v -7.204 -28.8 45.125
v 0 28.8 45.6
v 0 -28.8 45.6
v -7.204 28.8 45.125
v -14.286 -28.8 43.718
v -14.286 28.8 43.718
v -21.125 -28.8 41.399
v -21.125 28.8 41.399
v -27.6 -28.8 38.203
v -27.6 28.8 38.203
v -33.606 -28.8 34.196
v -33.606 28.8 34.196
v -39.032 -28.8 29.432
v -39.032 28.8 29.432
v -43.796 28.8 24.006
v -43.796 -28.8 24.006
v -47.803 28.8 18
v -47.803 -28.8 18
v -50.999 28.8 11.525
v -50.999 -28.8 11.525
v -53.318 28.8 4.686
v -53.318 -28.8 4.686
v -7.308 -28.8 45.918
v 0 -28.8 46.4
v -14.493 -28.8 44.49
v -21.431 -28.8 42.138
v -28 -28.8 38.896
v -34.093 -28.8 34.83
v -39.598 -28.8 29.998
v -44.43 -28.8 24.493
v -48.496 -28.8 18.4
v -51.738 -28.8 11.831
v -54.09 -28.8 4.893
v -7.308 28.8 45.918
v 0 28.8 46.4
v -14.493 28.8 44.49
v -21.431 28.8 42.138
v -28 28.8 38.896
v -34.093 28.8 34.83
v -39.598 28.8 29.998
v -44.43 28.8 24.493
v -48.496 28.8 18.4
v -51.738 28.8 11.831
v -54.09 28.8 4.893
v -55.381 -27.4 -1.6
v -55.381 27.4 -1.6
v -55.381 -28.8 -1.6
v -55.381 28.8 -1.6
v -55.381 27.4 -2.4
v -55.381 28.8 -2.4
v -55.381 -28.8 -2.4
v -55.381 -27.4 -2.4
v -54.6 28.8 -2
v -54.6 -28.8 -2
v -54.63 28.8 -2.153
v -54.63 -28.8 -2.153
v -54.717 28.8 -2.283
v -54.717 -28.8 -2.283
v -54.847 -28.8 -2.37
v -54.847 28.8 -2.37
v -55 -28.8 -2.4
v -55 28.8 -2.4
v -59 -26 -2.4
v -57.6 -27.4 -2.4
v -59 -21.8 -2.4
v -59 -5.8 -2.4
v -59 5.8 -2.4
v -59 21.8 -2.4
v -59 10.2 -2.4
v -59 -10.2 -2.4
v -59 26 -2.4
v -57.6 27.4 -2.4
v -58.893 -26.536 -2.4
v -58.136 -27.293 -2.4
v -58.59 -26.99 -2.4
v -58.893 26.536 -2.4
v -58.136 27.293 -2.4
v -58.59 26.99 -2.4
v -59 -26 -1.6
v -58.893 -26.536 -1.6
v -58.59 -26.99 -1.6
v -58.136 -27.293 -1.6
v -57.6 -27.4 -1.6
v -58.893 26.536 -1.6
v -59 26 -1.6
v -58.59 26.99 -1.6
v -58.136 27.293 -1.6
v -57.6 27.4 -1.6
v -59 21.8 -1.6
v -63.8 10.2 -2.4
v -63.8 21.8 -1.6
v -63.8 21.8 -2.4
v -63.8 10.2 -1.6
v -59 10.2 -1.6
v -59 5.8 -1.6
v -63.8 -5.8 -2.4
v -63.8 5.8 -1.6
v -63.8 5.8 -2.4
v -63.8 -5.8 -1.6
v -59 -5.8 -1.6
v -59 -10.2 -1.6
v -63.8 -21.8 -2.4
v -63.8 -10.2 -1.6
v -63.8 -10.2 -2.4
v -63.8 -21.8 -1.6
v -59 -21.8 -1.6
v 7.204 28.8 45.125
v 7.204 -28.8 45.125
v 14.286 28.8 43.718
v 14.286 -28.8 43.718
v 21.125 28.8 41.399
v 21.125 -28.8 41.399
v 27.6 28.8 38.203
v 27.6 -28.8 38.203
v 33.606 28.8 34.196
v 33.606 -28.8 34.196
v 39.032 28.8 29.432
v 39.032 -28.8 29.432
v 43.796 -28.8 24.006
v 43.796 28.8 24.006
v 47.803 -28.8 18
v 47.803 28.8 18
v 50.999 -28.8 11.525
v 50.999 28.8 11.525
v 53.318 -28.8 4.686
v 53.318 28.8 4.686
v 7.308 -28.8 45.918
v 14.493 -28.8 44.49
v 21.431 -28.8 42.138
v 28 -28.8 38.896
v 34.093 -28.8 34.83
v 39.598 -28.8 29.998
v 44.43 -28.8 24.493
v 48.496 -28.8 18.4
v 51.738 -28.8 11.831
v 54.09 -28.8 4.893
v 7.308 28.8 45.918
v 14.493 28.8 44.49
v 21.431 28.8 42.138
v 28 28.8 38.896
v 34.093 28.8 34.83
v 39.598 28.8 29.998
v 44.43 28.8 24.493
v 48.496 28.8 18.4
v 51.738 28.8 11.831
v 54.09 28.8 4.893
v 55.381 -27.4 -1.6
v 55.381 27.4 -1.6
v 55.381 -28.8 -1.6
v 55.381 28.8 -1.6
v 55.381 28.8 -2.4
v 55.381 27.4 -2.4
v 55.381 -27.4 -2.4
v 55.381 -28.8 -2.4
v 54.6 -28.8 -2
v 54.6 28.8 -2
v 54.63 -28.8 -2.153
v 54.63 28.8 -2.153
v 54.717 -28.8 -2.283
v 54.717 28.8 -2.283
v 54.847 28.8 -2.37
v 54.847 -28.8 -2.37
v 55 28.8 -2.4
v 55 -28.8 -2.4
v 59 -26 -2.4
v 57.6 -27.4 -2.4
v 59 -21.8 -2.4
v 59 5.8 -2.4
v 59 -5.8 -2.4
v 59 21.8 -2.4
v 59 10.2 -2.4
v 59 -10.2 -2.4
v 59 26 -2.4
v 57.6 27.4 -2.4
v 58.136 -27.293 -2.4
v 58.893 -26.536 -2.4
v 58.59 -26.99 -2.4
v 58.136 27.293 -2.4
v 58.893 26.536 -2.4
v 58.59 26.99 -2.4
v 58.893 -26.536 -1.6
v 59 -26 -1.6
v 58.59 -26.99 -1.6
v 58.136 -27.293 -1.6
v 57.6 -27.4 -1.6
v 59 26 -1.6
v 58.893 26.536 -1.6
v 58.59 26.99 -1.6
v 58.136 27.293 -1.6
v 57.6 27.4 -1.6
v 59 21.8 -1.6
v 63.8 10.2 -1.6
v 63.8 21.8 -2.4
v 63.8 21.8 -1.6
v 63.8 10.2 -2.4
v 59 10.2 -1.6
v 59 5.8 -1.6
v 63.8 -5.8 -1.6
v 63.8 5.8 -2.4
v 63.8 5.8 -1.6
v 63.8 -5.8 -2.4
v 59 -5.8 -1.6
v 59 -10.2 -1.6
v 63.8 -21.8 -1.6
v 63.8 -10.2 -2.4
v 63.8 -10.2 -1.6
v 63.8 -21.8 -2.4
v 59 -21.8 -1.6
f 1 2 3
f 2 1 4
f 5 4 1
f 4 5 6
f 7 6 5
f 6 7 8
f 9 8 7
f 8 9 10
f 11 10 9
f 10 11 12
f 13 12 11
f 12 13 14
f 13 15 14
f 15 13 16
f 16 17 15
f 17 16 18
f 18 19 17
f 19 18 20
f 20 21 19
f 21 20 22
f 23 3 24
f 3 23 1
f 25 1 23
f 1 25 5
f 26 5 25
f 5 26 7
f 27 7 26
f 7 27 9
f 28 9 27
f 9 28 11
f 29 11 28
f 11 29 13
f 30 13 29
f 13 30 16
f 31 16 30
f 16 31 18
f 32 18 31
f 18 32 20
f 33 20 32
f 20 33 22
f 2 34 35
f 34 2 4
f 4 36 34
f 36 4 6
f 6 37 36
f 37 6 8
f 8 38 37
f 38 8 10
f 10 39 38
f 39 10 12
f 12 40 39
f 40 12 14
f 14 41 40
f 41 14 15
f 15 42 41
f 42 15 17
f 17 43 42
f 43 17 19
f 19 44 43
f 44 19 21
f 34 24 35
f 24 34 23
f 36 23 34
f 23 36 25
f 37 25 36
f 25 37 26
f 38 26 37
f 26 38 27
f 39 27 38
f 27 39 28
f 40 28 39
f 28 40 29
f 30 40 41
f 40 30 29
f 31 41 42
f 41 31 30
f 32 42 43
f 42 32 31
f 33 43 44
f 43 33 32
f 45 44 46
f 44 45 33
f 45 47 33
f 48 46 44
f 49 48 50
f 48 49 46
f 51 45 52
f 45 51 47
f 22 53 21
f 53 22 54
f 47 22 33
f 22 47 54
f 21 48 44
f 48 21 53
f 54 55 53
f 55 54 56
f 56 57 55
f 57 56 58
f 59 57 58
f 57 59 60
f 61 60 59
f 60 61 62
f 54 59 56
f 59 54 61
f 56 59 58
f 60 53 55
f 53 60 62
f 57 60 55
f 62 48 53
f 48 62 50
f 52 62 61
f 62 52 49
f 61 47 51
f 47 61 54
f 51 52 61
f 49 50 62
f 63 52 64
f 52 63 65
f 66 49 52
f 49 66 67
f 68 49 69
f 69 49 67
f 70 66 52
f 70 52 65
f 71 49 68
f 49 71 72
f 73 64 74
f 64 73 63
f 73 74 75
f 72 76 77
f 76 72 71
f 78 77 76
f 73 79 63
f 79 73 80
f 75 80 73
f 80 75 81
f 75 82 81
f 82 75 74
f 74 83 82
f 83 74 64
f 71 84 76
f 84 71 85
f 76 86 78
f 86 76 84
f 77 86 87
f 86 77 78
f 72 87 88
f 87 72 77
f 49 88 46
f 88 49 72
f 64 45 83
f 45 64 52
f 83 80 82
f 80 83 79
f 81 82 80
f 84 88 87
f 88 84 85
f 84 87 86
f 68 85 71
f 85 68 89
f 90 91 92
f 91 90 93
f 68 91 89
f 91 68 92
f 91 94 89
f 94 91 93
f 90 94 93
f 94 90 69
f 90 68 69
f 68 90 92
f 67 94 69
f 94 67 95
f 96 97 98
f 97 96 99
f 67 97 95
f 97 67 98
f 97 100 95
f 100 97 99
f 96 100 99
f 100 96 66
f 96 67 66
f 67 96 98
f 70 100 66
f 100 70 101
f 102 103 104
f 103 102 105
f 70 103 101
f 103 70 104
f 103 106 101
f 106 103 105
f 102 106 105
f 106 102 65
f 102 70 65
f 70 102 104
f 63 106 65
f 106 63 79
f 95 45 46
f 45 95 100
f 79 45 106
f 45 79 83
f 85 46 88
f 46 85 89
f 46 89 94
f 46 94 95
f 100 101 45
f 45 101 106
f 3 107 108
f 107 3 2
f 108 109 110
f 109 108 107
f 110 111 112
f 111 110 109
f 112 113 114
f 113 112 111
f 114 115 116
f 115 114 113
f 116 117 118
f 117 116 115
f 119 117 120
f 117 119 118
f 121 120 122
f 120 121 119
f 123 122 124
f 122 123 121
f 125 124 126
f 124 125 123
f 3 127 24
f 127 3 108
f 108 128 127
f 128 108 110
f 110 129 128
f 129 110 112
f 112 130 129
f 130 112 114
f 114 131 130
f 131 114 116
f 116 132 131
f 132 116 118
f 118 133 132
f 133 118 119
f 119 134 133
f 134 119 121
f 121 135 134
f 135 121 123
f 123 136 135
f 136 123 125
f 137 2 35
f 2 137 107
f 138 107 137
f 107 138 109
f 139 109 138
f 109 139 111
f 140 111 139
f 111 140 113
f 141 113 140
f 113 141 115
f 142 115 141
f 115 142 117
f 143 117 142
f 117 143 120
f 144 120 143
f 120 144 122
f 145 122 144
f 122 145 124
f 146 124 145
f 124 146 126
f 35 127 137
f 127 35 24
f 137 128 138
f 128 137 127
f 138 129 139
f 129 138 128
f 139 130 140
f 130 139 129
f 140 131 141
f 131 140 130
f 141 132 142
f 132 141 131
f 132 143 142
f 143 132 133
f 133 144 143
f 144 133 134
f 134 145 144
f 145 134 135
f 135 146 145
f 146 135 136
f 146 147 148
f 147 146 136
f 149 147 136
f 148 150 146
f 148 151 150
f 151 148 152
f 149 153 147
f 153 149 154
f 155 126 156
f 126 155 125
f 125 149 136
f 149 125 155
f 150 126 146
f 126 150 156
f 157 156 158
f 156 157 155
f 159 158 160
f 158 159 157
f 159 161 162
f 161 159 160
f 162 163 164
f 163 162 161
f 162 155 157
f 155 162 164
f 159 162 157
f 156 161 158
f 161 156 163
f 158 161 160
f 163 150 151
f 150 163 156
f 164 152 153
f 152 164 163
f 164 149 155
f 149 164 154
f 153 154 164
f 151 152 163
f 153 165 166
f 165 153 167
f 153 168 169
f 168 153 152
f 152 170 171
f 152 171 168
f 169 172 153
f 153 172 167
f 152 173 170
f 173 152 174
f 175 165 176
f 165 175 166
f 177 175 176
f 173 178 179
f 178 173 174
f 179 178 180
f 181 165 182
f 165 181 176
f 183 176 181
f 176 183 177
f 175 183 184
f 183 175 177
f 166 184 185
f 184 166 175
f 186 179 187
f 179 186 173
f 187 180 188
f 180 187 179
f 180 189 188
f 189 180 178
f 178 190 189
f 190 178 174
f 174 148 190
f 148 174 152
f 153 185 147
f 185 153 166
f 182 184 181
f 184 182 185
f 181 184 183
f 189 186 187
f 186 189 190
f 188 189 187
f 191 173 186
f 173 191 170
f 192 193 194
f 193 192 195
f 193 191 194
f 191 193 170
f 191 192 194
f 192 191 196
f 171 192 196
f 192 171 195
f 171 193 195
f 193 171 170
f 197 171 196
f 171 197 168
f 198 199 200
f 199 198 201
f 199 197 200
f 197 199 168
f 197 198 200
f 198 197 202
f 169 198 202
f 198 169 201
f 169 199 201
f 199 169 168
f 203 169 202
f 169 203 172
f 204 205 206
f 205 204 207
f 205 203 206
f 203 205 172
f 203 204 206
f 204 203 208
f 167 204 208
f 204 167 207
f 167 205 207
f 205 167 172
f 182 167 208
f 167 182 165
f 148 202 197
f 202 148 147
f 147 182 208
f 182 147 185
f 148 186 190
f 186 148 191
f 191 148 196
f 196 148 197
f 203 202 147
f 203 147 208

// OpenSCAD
// file: ../p/48/5-24edge.scad
use <../../lib.scad>
function ldraw_lib__48__5_24edge() = [
// 0 Hi-Res Circle 0.2083
// 0 Name: 48\5-24edge.dat
// 0 Author: Paul Easter [pneaster]
// 0 !LDRAW_ORG 48_Primitive UPDATE 2009-03
// 0 !LICENSE Licensed under CC BY 4.0 : see CAreadme.txt
// 
// 0 BFC CERTIFY CCW
  [0,"BFC","CERTIFY"],
  [0,"BFC","CCW"],
// 
// 0 !HISTORY 2009-12-29 [PTadmin] Official Update 2009-03
// 
// 
// 2 24 1 0 0 .9914 0 .1305
  [2,24,1,0,0,.9914,0,.1305],
// 2 24 .9914 0 .1305 .9659 0 .2588
  [2,24,.9914,0,.1305,.9659,0,.2588],
// 2 24 .9659 0 .2588 .9239 0 .3827
  [2,24,.9659,0,.2588,.9239,0,.3827],
// 2 24 .9239 0 .3827 .866 0 .5
  [2,24,.9239,0,.3827,.866,0,.5],
// 2 24 .866 0 .5 .7934 0 .6088
  [2,24,.866,0,.5,.7934,0,.6088],
// 2 24 .7934 0 .6088 .7071 0 .7071
  [2,24,.7934,0,.6088,.7071,0,.7071],
// 2 24 .7071 0 .7071 .6088 0 .7934
  [2,24,.7071,0,.7071,.6088,0,.7934],
// 2 24 .6088 0 .7934 .5 0 .866
  [2,24,.6088,0,.7934,.5,0,.866],
// 2 24 .5 0 .866 .3827 0 .9239
  [2,24,.5,0,.866,.3827,0,.9239],
// 2 24 .3827 0 .9239 .2588 0 .9659
  [2,24,.3827,0,.9239,.2588,0,.9659],
// 
// 0 end of file
// 
];
module ldraw_lib__48__5_24edge(step=0, col=false, unit=2/5, alt=false, line=0.2, solid=!$preview)
    makepoly(ldraw_lib__48__5_24edge(), step=step, col=col, unit=unit, alt=alt, line=line, solid=solid);
ldraw_lib__48__5_24edge(line=0.2);
// file: ../p/48/5-24cyli.scad
use <../../lib.scad>
function ldraw_lib__48__5_24cyli() = [
// 0 Hi-Res Cylinder 0.2083
// 0 Name: 48\5-24cyli.dat
// 0 Author: Willy Tschager [Holly-Wood]
// 0 !LDRAW_ORG 48_Primitive UPDATE 2024-01
// 0 !LICENSE Licensed under CC BY 4.0 : see CAreadme.txt
// 
// 0 BFC CERTIFY CCW
  [0,"BFC","CERTIFY"],
  [0,"BFC","CCW"],
// 
// 0 !HISTORY 2009-12-29 [PTadmin] Official Update 2009-03
// 0 !HISTORY 2024-01-16 [Holly-Wood] Complete regeneration, original by guyvivan
// 0 !HISTORY 2024-01-29 [OrionP] Official Update 2024-01
// 
// 4 16 0.9914 0 0.1305 1 0 0 1 1 0 0.9914 1 0.1305
  [4,16,0.9914,0,0.1305,1,0,0,1,1,0,0.9914,1,0.1305],
// 4 16 0.9659 0 0.2588 0.9914 0 0.1305 0.9914 1 0.1305 0.9659 1 0.2588
  [4,16,0.9659,0,0.2588,0.9914,0,0.1305,0.9914,1,0.1305,0.9659,1,0.2588],
// 4 16 0.9239 0 0.3827 0.9659 0 0.2588 0.9659 1 0.2588 0.9239 1 0.3827
  [4,16,0.9239,0,0.3827,0.9659,0,0.2588,0.9659,1,0.2588,0.9239,1,0.3827],
// 4 16 0.866 0 0.5 0.9239 0 0.3827 0.9239 1 0.3827 0.866 1 0.5
  [4,16,0.866,0,0.5,0.9239,0,0.3827,0.9239,1,0.3827,0.866,1,0.5],
// 4 16 0.7934 0 0.6088 0.866 0 0.5 0.866 1 0.5 0.7934 1 0.6088
  [4,16,0.7934,0,0.6088,0.866,0,0.5,0.866,1,0.5,0.7934,1,0.6088],
// 4 16 0.7071 0 0.7071 0.7934 0 0.6088 0.7934 1 0.6088 0.7071 1 0.7071
  [4,16,0.7071,0,0.7071,0.7934,0,0.6088,0.7934,1,0.6088,0.7071,1,0.7071],
// 4 16 0.6088 0 0.7934 0.7071 0 0.7071 0.7071 1 0.7071 0.6088 1 0.7934
  [4,16,0.6088,0,0.7934,0.7071,0,0.7071,0.7071,1,0.7071,0.6088,1,0.7934],
// 4 16 0.5 0 0.866 0.6088 0 0.7934 0.6088 1 0.7934 0.5 1 0.866
  [4,16,0.5,0,0.866,0.6088,0,0.7934,0.6088,1,0.7934,0.5,1,0.866],
// 4 16 0.3827 0 0.9239 0.5 0 0.866 0.5 1 0.866 0.3827 1 0.9239
  [4,16,0.3827,0,0.9239,0.5,0,0.866,0.5,1,0.866,0.3827,1,0.9239],
// 4 16 0.2588 0 0.9659 0.3827 0 0.9239 0.3827 1 0.9239 0.2588 1 0.9659
  [4,16,0.2588,0,0.9659,0.3827,0,0.9239,0.3827,1,0.9239,0.2588,1,0.9659],
// 0 // conditional lines
// 5 24 1 1 0 1 0 0 1 1 -0.1317 0.9914 1 0.1305
  [5,24,1,1,0,1,0,0,1,1,-0.1317,0.9914,1,0.1305],
// 5 24 0.9914 1 0.1305 0.9914 0 0.1305 1 1 0 0.9659 1 0.2588
  [5,24,0.9914,1,0.1305,0.9914,0,0.1305,1,1,0,0.9659,1,0.2588],
// 5 24 0.9659 1 0.2588 0.9659 0 0.2588 0.9914 1 0.1305 0.9239 1 0.3827
  [5,24,0.9659,1,0.2588,0.9659,0,0.2588,0.9914,1,0.1305,0.9239,1,0.3827],
// 5 24 0.9239 1 0.3827 0.9239 0 0.3827 0.9659 1 0.2588 0.866 1 0.5
  [5,24,0.9239,1,0.3827,0.9239,0,0.3827,0.9659,1,0.2588,0.866,1,0.5],
// 5 24 0.866 1 0.5 0.866 0 0.5 0.9239 1 0.3827 0.7934 1 0.6088
  [5,24,0.866,1,0.5,0.866,0,0.5,0.9239,1,0.3827,0.7934,1,0.6088],
// 5 24 0.7934 1 0.6088 0.7934 0 0.6088 0.866 1 0.5 0.7071 1 0.7071
  [5,24,0.7934,1,0.6088,0.7934,0,0.6088,0.866,1,0.5,0.7071,1,0.7071],
// 5 24 0.7071 1 0.7071 0.7071 0 0.7071 0.7934 1 0.6088 0.6088 1 0.7934
  [5,24,0.7071,1,0.7071,0.7071,0,0.7071,0.7934,1,0.6088,0.6088,1,0.7934],
// 5 24 0.6088 1 0.7934 0.6088 0 0.7934 0.7071 1 0.7071 0.5 1 0.866
  [5,24,0.6088,1,0.7934,0.6088,0,0.7934,0.7071,1,0.7071,0.5,1,0.866],
// 5 24 0.5 1 0.866 0.5 0 0.866 0.6088 1 0.7934 0.3827 1 0.9239
  [5,24,0.5,1,0.866,0.5,0,0.866,0.6088,1,0.7934,0.3827,1,0.9239],
// 5 24 0.3827 1 0.9239 0.3827 0 0.9239 0.5 1 0.866 0.2588 1 0.9659
  [5,24,0.3827,1,0.9239,0.3827,0,0.9239,0.5,1,0.866,0.2588,1,0.9659],
// 5 24 0.2588 1 0.9659 0.2588 0 0.9659 0.3827 1 0.9239 0.1317 1 1
  [5,24,0.2588,1,0.9659,0.2588,0,0.9659,0.3827,1,0.9239,0.1317,1,1],
// 0 // Build by LDPartEditor (PrimGen 2.X)
];
module ldraw_lib__48__5_24cyli(step=0, col=false, unit=2/5, alt=false, line=0.2, solid=!$preview)
    makepoly(ldraw_lib__48__5_24cyli(), step=step, col=col, unit=unit, alt=alt, line=line, solid=solid);
ldraw_lib__48__5_24cyli(line=0.2);
// file: ../p/1-4edge.scad
use <../lib.scad>
function ldraw_lib__1_4edge() = [
// 0 Circle 0.25
// 0 Name: 1-4edge.dat
// 0 Author: James Jessiman
// 0 !LDRAW_ORG Primitive UPDATE 2017-01
// 0 !LICENSE Licensed under CC BY 4.0 : see CAreadme.txt
// 
// 0 BFC CERTIFY CCW
  [0,"BFC","CERTIFY"],
  [0,"BFC","CCW"],
// 
// 0 !HISTORY 2007-06-22 [PTadmin] Header formatted for Contributor Agreement
// 0 !HISTORY 2008-07-01 [PTadmin] Official Update 2008-01
// 0 !HISTORY 2017-01-15 [Steffen] BFCed
// 0 !HISTORY 2017-12-30 [PTadmin] Official Update 2017-01
// 
// 
// 2 24 1 0 0 0.9239 0 0.3827
  [2,24,1,0,0,0.9239,0,0.3827],
// 2 24 0.9239 0 0.3827 0.7071 0 0.7071
  [2,24,0.9239,0,0.3827,0.7071,0,0.7071],
// 2 24 0.7071 0 0.7071 0.3827 0 0.9239
  [2,24,0.7071,0,0.7071,0.3827,0,0.9239],
// 2 24 0.3827 0 0.9239 0 0 1
  [2,24,0.3827,0,0.9239,0,0,1],
];
module ldraw_lib__1_4edge(step=0, col=false, unit=2/5, alt=false, line=0.2, solid=!$preview)
    makepoly(ldraw_lib__1_4edge(), step=step, col=col, unit=unit, alt=alt, line=line, solid=solid);
ldraw_lib__1_4edge(line=0.2);
// file: ../p/1-4cyli.scad
use <../lib.scad>
function ldraw_lib__1_4cyli() = [
// 0 Cylinder 0.25
// 0 Name: 1-4cyli.dat
// 0 Author: James Jessiman
// 0 !LDRAW_ORG Primitive UPDATE 2012-01
// 0 !LICENSE Licensed under CC BY 4.0 : see CAreadme.txt
// 
// 0 BFC CERTIFY CCW
  [0,"BFC","CERTIFY"],
  [0,"BFC","CCW"],
// 
// 0 !HISTORY 2002-03-23 [sbliss] Added BFC statement.
// 0 !HISTORY 2002-04-25 [PTadmin] Official Update 2002-02
// 0 !HISTORY 2007-06-22 [PTadmin] Header formatted for Contributor Agreement
// 0 !HISTORY 2008-07-01 [PTadmin] Official Update 2008-01
// 0 !HISTORY 2012-02-16 [Philo] Changed to CCW
// 0 !HISTORY 2012-03-30 [PTadmin] Official Update 2012-01
// 
// 
// 4 16 1 1 0 0.9239 1 0.3827 0.9239 0 0.3827 1 0 0
  [4,16,1,1,0,0.9239,1,0.3827,0.9239,0,0.3827,1,0,0],
// 5 24 1 0 0 1 1 0 0.9239 0 0.3827 1 0 -1
  [5,24,1,0,0,1,1,0,0.9239,0,0.3827,1,0,-1],
// 4 16 0.9239 1 0.3827 0.7071 1 0.7071 0.7071 0 0.7071 0.9239 0 0.3827
  [4,16,0.9239,1,0.3827,0.7071,1,0.7071,0.7071,0,0.7071,0.9239,0,0.3827],
// 5 24 0.9239 0 0.3827 0.9239 1 0.3827 0.7071 0 0.7071 1 0 0
  [5,24,0.9239,0,0.3827,0.9239,1,0.3827,0.7071,0,0.7071,1,0,0],
// 4 16 0.7071 1 0.7071 0.3827 1 0.9239 0.3827 0 0.9239 0.7071 0 0.7071
  [4,16,0.7071,1,0.7071,0.3827,1,0.9239,0.3827,0,0.9239,0.7071,0,0.7071],
// 5 24 0.7071 0 0.7071 0.7071 1 0.7071 0.3827 0 0.9239 0.9239 0 0.3827
  [5,24,0.7071,0,0.7071,0.7071,1,0.7071,0.3827,0,0.9239,0.9239,0,0.3827],
// 4 16 0.3827 1 0.9239 0 1 1 0 0 1 0.3827 0 0.9239
  [4,16,0.3827,1,0.9239,0,1,1,0,0,1,0.3827,0,0.9239],
// 5 24 0.3827 0 0.9239 0.3827 1 0.9239 0 0 1 0.7071 0 0.7071
  [5,24,0.3827,0,0.9239,0.3827,1,0.9239,0,0,1,0.7071,0,0.7071],
// 5 24 0 0 1 0 1 1 0.3827 0 0.9239 -1 0 1
  [5,24,0,0,1,0,1,1,0.3827,0,0.9239,-1,0,1],
];
module ldraw_lib__1_4cyli(step=0, col=false, unit=2/5, alt=false, line=0.2, solid=!$preview)
    makepoly(ldraw_lib__1_4cyli(), step=step, col=col, unit=unit, alt=alt, line=line, solid=solid);
ldraw_lib__1_4cyli(line=0.2);
// file: ../p/recte3.scad
use <../lib.scad>
function ldraw_lib__recte3() = [
// 0 Rectangle Empty with 3 Edges
// 0 Name: recte3.dat
// 0 Author: Steffen [Steffen]
// 0 !LDRAW_ORG Primitive UPDATE 2011-01
// 0 !LICENSE Licensed under CC BY 4.0 : see CAreadme.txt
// 
// 0 BFC CERTIFY CCW
  [0,"BFC","CERTIFY"],
  [0,"BFC","CCW"],
// 
// 0 !HISTORY 2011-07-25 [PTadmin] Official Update 2011-01
// 
// 
// 2 24 1 0 1 -1 0 1
  [2,24,1,0,1,-1,0,1],
// 2 24 -1 0 1 -1 0 -1
  [2,24,-1,0,1,-1,0,-1],
// 2 24 1 0 -1 1 0 1
  [2,24,1,0,-1,1,0,1],
];
module ldraw_lib__recte3(step=0, col=false, unit=2/5, alt=false, line=0.2, solid=!$preview)
    makepoly(ldraw_lib__recte3(), step=step, col=col, unit=unit, alt=alt, line=line, solid=solid);
ldraw_lib__recte3(line=0.2);
// file: ../p/rect3.scad
use <../lib.scad>
function ldraw_lib__rect3() = [
// 0 Rectangle with 3 Edges
// 0 Name: rect3.dat
// 0 Author: Mark Kennedy [mkennedy]
// 0 !LDRAW_ORG Primitive UPDATE 2010-01
// 0 !LICENSE Licensed under CC BY 4.0 : see CAreadme.txt
// 
// 0 BFC CERTIFY CCW
  [0,"BFC","CERTIFY"],
  [0,"BFC","CCW"],
// 
// 0 !HISTORY 2003-08-01 [PTadmin] Official Update 2003-02
// 0 !HISTORY 2007-06-24 [PTadmin] Header formatted for Contributor Agreement
// 0 !HISTORY 2008-07-01 [PTadmin] Official Update 2008-01
// 0 !HISTORY 2010-01-17 [mikeheide] Change winding to CCW
// 0 !HISTORY 2010-04-05 [PTadmin] Official Update 2010-01
// 
// 
// 2 24 1 0 1 -1 0 1
  [2,24,1,0,1,-1,0,1],
// 2 24 1 0 1 1 0 -1
  [2,24,1,0,1,1,0,-1],
// 2 24 -1 0 1 -1 0 -1
  [2,24,-1,0,1,-1,0,-1],
// 4 16 -1 0 1 -1 0 -1 1 0 -1 1 0 1
  [4,16,-1,0,1,-1,0,-1,1,0,-1,1,0,1],
// 0 //
];
module ldraw_lib__rect3(step=0, col=false, unit=2/5, alt=false, line=0.2, solid=!$preview)
    makepoly(ldraw_lib__rect3(), step=step, col=col, unit=unit, alt=alt, line=line, solid=solid);
ldraw_lib__rect3(line=0.2);
// file: ../p/rect2a.scad
use <../lib.scad>
function ldraw_lib__rect2a() = [
// 0 Rectangle with 2 Adjacent Edges
// 0 Name: rect2a.dat
// 0 Author: Chris Dee [cwdee]
// 0 !LDRAW_ORG Primitive UPDATE 2010-01
// 0 !LICENSE Licensed under CC BY 4.0 : see CAreadme.txt
// 
// 0 BFC CERTIFY CCW
  [0,"BFC","CERTIFY"],
  [0,"BFC","CCW"],
// 
// 0 !HISTORY 2003-12-19 [PTadmin] Official Update 2003-03
// 0 !HISTORY 2007-06-24 [PTadmin] Header formatted for Contributor Agreement
// 0 !HISTORY 2008-07-01 [PTadmin] Official Update 2008-01
// 0 !HISTORY 2010-01-17 [mikeheide] changed winding to CCW
// 0 !HISTORY 2010-04-05 [PTadmin] Official Update 2010-01
// 
// 
// 2 24 1 0 1 -1 0 1
  [2,24,1,0,1,-1,0,1],
// 2 24 1 0 -1 1 0 1
  [2,24,1,0,-1,1,0,1],
// 4 16 -1 0 1 -1 0 -1 1 0 -1 1 0 1
  [4,16,-1,0,1,-1,0,-1,1,0,-1,1,0,1],
// 0
];
module ldraw_lib__rect2a(step=0, col=false, unit=2/5, alt=false, line=0.2, solid=!$preview)
    makepoly(ldraw_lib__rect2a(), step=step, col=col, unit=unit, alt=alt, line=line, solid=solid);
ldraw_lib__rect2a(line=0.2);
// file: ../p/rect.scad
use <../lib.scad>
function ldraw_lib__rect() = [
// 0 Rectangle
// 0 Name: rect.dat
// 0 Author: James Jessiman
// 0 !LDRAW_ORG Primitive UPDATE 2010-01
// 0 !LICENSE Licensed under CC BY 4.0 : see CAreadme.txt
// 
// 0 BFC CERTIFY CCW
  [0,"BFC","CERTIFY"],
  [0,"BFC","CCW"],
// 
// 0 !HISTORY 2002-04-05 [hafhead] Added BFC statement
// 0 !HISTORY 2002-04-25 [PTadmin] Official Update 2002-02
// 0 !HISTORY 2007-06-24 [PTadmin] Header formatted for Contributor Agreement
// 0 !HISTORY 2008-07-01 [PTadmin] Official Update 2008-01
// 0 !HISTORY 2010-01-17 [mikeheide] changed winding to CCW
// 0 !HISTORY 2010-04-05 [PTadmin] Official Update 2010-01
// 
// 
// 2 24 1 0 1 -1 0 1
  [2,24,1,0,1,-1,0,1],
// 2 24 -1 0 1 -1 0 -1
  [2,24,-1,0,1,-1,0,-1],
// 2 24 -1 0 -1 1 0 -1
  [2,24,-1,0,-1,1,0,-1],
// 2 24 1 0 -1 1 0 1
  [2,24,1,0,-1,1,0,1],
// 4 16 -1 0 1 -1 0 -1 1 0 -1 1 0 1
  [4,16,-1,0,1,-1,0,-1,1,0,-1,1,0,1],
// 0
];
module ldraw_lib__rect(step=0, col=false, unit=2/5, alt=false, line=0.2, solid=!$preview)
    makepoly(ldraw_lib__rect(), step=step, col=col, unit=unit, alt=alt, line=line, solid=solid);
ldraw_lib__rect(line=0.2);
// file: ../p/box5-4a.scad
use <../lib.scad>
function ldraw_lib__box5_4a() = [
// 0 Box with  5 Faces without  4 Adjacent Edges
// 0 Name: box5-4a.dat
// 0 Author: Willy Tschager [Holly-Wood]
// 0 !LDRAW_ORG Primitive UPDATE 2024-01
// 0 !LICENSE Licensed under CC BY 4.0 : see CAreadme.txt
// 
// 0 BFC CERTIFY CCW
  [0,"BFC","CERTIFY"],
  [0,"BFC","CCW"],
// 
// 0 !HISTORY 2009-05-02 [PTadmin] Official Update 2009-01
// 0 !HISTORY 2024-01-03 [Holly-Wood] Complete re-write, original by guyvivan
// 0 !HISTORY 2024-01-29 [OrionP] Official Update 2024-01
// 
// 2 24 -1 1 -1 -1 1 1
  [2,24,-1,1,-1,-1,1,1],
// 2 24 1 1 1 1 1 -1
  [2,24,1,1,1,1,1,-1],
// 2 24 -1 1 1 1 1 1
  [2,24,-1,1,1,1,1,1],
// 2 24 -1 1 -1 1 1 -1
  [2,24,-1,1,-1,1,1,-1],
// 4 16 1 1 1 1 1 -1 -1 1 -1 -1 1 1
  [4,16,1,1,1,1,1,-1,-1,1,-1,-1,1,1],
// 
// 2 24 -1 0 -1 -1 1 -1
  [2,24,-1,0,-1,-1,1,-1],
// 2 24 -1 1 1 -1 0 1
  [2,24,-1,1,1,-1,0,1],
// 4 16 -1 1 1 -1 1 -1 -1 0 -1 -1 0 1
  [4,16,-1,1,1,-1,1,-1,-1,0,-1,-1,0,1],
// 
// 2 24 1 0 -1 1 1 -1
  [2,24,1,0,-1,1,1,-1],
// 2 24 1 1 1 1 0 1
  [2,24,1,1,1,1,0,1],
// 4 16 1 1 -1 1 1 1 1 0 1 1 0 -1
  [4,16,1,1,-1,1,1,1,1,0,1,1,0,-1],
// 
// 4 16 1 1 1 -1 1 1 -1 0 1 1 0 1
  [4,16,1,1,1,-1,1,1,-1,0,1,1,0,1],
// 4 16 -1 1 -1 1 1 -1 1 0 -1 -1 0 -1
  [4,16,-1,1,-1,1,1,-1,1,0,-1,-1,0,-1],
];
module ldraw_lib__box5_4a(step=0, col=false, unit=2/5, alt=false, line=0.2, solid=!$preview)
    makepoly(ldraw_lib__box5_4a(), step=step, col=col, unit=unit, alt=alt, line=line, solid=solid);
ldraw_lib__box5_4a(line=0.2);
// file: ../p/48/5-24ring69.scad
use <../../lib.scad>
function ldraw_lib__48__5_24ring69() = [
// 0 Hi-Res Ring 69 x 0.2083
// 0 Name: 48\5-24ring69.dat
// 0 Author: Gerald Lasser [GeraldLasser]
// 0 !LDRAW_ORG 48_Primitive UPDATE 2024-08
// 0 !LICENSE Licensed under CC BY 4.0 : see CAreadme.txt
// 
// 0 BFC CERTIFY CCW
  [0,"BFC","CERTIFY"],
  [0,"BFC","CCW"],
// 
// 0 !HISTORY 2024-09-30 [OrionP] Official Update 2024-08
// 
// 
// 4 16 70 0 0 69.398 0 9.135 68.4066 0 9.0045 69 0 0
  [4,16,70,0,0,69.398,0,9.135,68.4066,0,9.0045,69,0,0],
// 4 16 69.398 0 9.135 67.613 0 18.116 66.6471 0 17.8572 68.4066 0 9.0045
  [4,16,69.398,0,9.135,67.613,0,18.116,66.6471,0,17.8572,68.4066,0,9.0045],
// 4 16 67.613 0 18.116 64.673 0 26.789 63.7491 0 26.4063 66.6471 0 17.8572
  [4,16,67.613,0,18.116,64.673,0,26.789,63.7491,0,26.4063,66.6471,0,17.8572],
// 4 16 64.673 0 26.789 60.62 0 35 59.754 0 34.5 63.7491 0 26.4063
  [4,16,64.673,0,26.789,60.62,0,35,59.754,0,34.5,63.7491,0,26.4063],
// 4 16 60.62 0 35 55.538 0 42.616 54.7446 0 42.0072 59.754 0 34.5
  [4,16,60.62,0,35,55.538,0,42.616,54.7446,0,42.0072,59.754,0,34.5],
// 4 16 55.538 0 42.616 49.497 0 49.497 48.7899 0 48.7899 54.7446 0 42.0072
  [4,16,55.538,0,42.616,49.497,0,49.497,48.7899,0,48.7899,54.7446,0,42.0072],
// 4 16 49.497 0 49.497 42.616 0 55.538 42.0072 0 54.7446 48.7899 0 48.7899
  [4,16,49.497,0,49.497,42.616,0,55.538,42.0072,0,54.7446,48.7899,0,48.7899],
// 4 16 42.616 0 55.538 35 0 60.62 34.5 0 59.754 42.0072 0 54.7446
  [4,16,42.616,0,55.538,35,0,60.62,34.5,0,59.754,42.0072,0,54.7446],
// 4 16 35 0 60.62 26.789 0 64.673 26.4063 0 63.7491 34.5 0 59.754
  [4,16,35,0,60.62,26.789,0,64.673,26.4063,0,63.7491,34.5,0,59.754],
// 4 16 26.789 0 64.673 18.116 0 67.613 17.8572 0 66.6471 26.4063 0 63.7491
  [4,16,26.789,0,64.673,18.116,0,67.613,17.8572,0,66.6471,26.4063,0,63.7491],
// 0 // Build by LDPartEditor (PrimGen 2.X)
];
module ldraw_lib__48__5_24ring69(step=0, col=false, unit=2/5, alt=false, line=0.2, solid=!$preview)
    makepoly(ldraw_lib__48__5_24ring69(), step=step, col=col, unit=unit, alt=alt, line=line, solid=solid);
ldraw_lib__48__5_24ring69(line=0.2);
// file: ../p/48/5-24cylo.scad
use <../../lib.scad>
use <5-24cyli.scad>
use <5-24edge.scad>
function ldraw_lib__48__5_24cylo() = [
// 0 Hi-Res Cylinder Open 0.2083
// 0 Name: 48\5-24cylo.dat
// 0 Author: Max Martin Richter [MMR1988]
// 0 !LDRAW_ORG 48_Primitive UPDATE 2013-01
// 0 !LICENSE Licensed under CC BY 4.0 : see CAreadme.txt
// 
// 0 BFC CERTIFY CCW
  [0,"BFC","CERTIFY"],
  [0,"BFC","CCW"],
// 
// 0 !HISTORY 2013-07-21 [PTadmin] Official Update 2013-01
// 
// 
// 1 16 0 0 0 1 0 0 0 1 0 0 0 1 48\5-24edge.dat
  [1,16,0,0,0,1,0,0,0,1,0,0,0,1, ldraw_lib__48__5_24edge()],
// 1 16 0 1 0 1 0 0 0 1 0 0 0 1 48\5-24edge.dat
  [1,16,0,1,0,1,0,0,0,1,0,0,0,1, ldraw_lib__48__5_24edge()],
// 1 16 0 0 0 1 0 0 0 1 0 0 0 1 48\5-24cyli.dat
  [1,16,0,0,0,1,0,0,0,1,0,0,0,1, ldraw_lib__48__5_24cyli()],
];
module ldraw_lib__48__5_24cylo(step=0, col=false, unit=2/5, alt=false, line=0.2, solid=!$preview)
    makepoly(ldraw_lib__48__5_24cylo(), step=step, col=col, unit=unit, alt=alt, line=line, solid=solid);
ldraw_lib__48__5_24cylo(line=0.2);
// file: ../p/1-4cylo.scad
use <../lib.scad>
use <1-4cyli.scad>
use <1-4edge.scad>
function ldraw_lib__1_4cylo() = [
// 0 Cylinder Open 0.25
// 0 Name: 1-4cylo.dat
// 0 Author: Max Martin Richter [MMR1988]
// 0 !LDRAW_ORG Primitive UPDATE 2010-03
// 0 !LICENSE Licensed under CC BY 4.0 : see CAreadme.txt
// 
// 0 BFC CERTIFY CCW
  [0,"BFC","CERTIFY"],
  [0,"BFC","CCW"],
// 
// 0 !HISTORY 2010-12-31 [PTadmin] Official Update 2010-03
// 
// 
// 1 16 0 0 0 1 0 0 0 1 0 0 0 1 1-4edge.dat
  [1,16,0,0,0,1,0,0,0,1,0,0,0,1, ldraw_lib__1_4edge()],
// 1 16 0 1 0 1 0 0 0 1 0 0 0 1 1-4edge.dat
  [1,16,0,1,0,1,0,0,0,1,0,0,0,1, ldraw_lib__1_4edge()],
// 1 16 0 0 0 1 0 0 0 1 0 0 0 1 1-4cyli.dat
  [1,16,0,0,0,1,0,0,0,1,0,0,0,1, ldraw_lib__1_4cyli()],
];
module ldraw_lib__1_4cylo(step=0, col=false, unit=2/5, alt=false, line=0.2, solid=!$preview)
    makepoly(ldraw_lib__1_4cylo(), step=step, col=col, unit=unit, alt=alt, line=line, solid=solid);
ldraw_lib__1_4cylo(line=0.2);
// file: ../p/1-4chrd.scad
use <../lib.scad>
function ldraw_lib__1_4chrd() = [
// 0 Chord 0.25
// 0 Name: 1-4chrd.dat
// 0 Author: Max Martin Richter [MMR1988]
// 0 !LDRAW_ORG Primitive UPDATE 2023-05
// 0 !LICENSE Licensed under CC BY 4.0 : see CAreadme.txt
// 
// 0 BFC CERTIFY CCW
  [0,"BFC","CERTIFY"],
  [0,"BFC","CCW"],
// 
// 0 !HISTORY 2004-04-22 [PTadmin] Official Update 2004-02
// 0 !HISTORY 2007-10-09 [PTadmin] Header formatted for Contributor Agreement
// 0 !HISTORY 2008-07-01 [PTadmin] Official Update 2008-01
// 0 !HISTORY 2012-08-02 [MMR1988] Re-creation with PrimGen2 and Rectifier
// 0 !HISTORY 2012-08-09 [PTadmin] Official Update 2012-02
// 0 !HISTORY 2023-10-27 [OrionP] Change author to MMR1988 from hafhead
// 0 !HISTORY 2023-10-31 [OrionP] Official Update 2023-05
// 
// 4 16 0.9239 0 0.3827 0.3827 0 0.9239 0 0 1 1 0 0
  [4,16,0.9239,0,0.3827,0.3827,0,0.9239,0,0,1,1,0,0],
// 3 16 0.7071 0 0.7071 0.3827 0 0.9239 0.9239 0 0.3827
  [3,16,0.7071,0,0.7071,0.3827,0,0.9239,0.9239,0,0.3827],
];
module ldraw_lib__1_4chrd(step=0, col=false, unit=2/5, alt=false, line=0.2, solid=!$preview)
    makepoly(ldraw_lib__1_4chrd(), step=step, col=col, unit=unit, alt=alt, line=line, solid=solid);
ldraw_lib__1_4chrd(line=0.2);
// main file
use <../lib.scad>
use <../p/1-4chrd.scad>
use <../p/1-4cylo.scad>
use <../p/48/5-24cylo.scad>
use <../p/48/5-24ring69.scad>
use <../p/box5-4a.scad>
use <../p/rect.scad>
use <../p/rect2a.scad>
use <../p/rect3.scad>
use <../p/recte3.scad>
function ldraw_lib__u9540() = [
// 0 ~Sunroof for Duplo Arch  4 x 10 x  3
// 0 Name: u9540.dat
// 0 Author: Gerald Lasser [GeraldLasser]
// 0 !LDRAW_ORG Part UPDATE 2024-08
// 0 !LICENSE Licensed under CC BY 4.0 : see CAreadme.txt
// 
// 0 BFC CERTIFY CCW
  [0,"BFC","CERTIFY"],
  [0,"BFC","CCW"],
// 
// 0 !CATEGORY Window
// 
// 0 !HISTORY 2024-09-30 [OrionP] Official Update 2024-08
// 
// 
// 0 BFC INVERTNEXT
  [0,"BFC","INVERTNEXT"],
// 1 16 0 24 -72 0 0 -138 -138 0 0 0 144 0 48\5-24cylo.dat
  [1,16,0,24,-72,0,0,-138,-138,0,0,0,144,0, ldraw_lib__48__5_24cylo()],
// 1 16 0 24 -72 0 0 -2 -2 0 0 0 1 0 48\5-24ring69.dat
  [1,16,0,24,-72,0,0,-2,-2,0,0,0,1,0, ldraw_lib__48__5_24ring69()],
// 1 16 0 24 72 0 0 -2 -2 0 0 0 -1 0 48\5-24ring69.dat
  [1,16,0,24,72,0,0,-2,-2,0,0,0,-1,0, ldraw_lib__48__5_24ring69()],
// 1 16 0 24 -72 0 0 -140 -140 0 0 0 144 0 48\5-24cylo.dat
  [1,16,0,24,-72,0,0,-140,-140,0,0,0,144,0, ldraw_lib__48__5_24cylo()],
// 4 16 -135.226 -12.232 -72 -135.226 -12.232 72 -138.4522 4 68.5 -138.4522 4 -68.5
  [4,16,-135.226,-12.232,-72,-135.226,-12.232,72,-138.4522,4,68.5,-138.4522,4,-68.5],
// 3 16 -138.4522 4 -68.5 -138.4522 4 -72 -135.226 -12.232 -72
  [3,16,-138.4522,4,-68.5,-138.4522,4,-72,-135.226,-12.232,-72],
// 3 16 -138.4522 4 72 -138.4522 4 68.5 -135.226 -12.232 72
  [3,16,-138.4522,4,72,-138.4522,4,68.5,-135.226,-12.232,72],
// 1 16 -138.4522 5 70.25 0 1 0 0 0 1 1.75 0 0 rect2a.dat
  [1,16,-138.4522,5,70.25,0,1,0,0,0,1,1.75,0,0, ldraw_lib__rect2a()],
// 1 16 -138.4522 5 -70.25 0 1 0 0 0 1 -1.75 0 0 rect2a.dat
  [1,16,-138.4522,5,-70.25,0,1,0,0,0,1,-1.75,0,0, ldraw_lib__rect2a()],
// 4 16 -136.5 5 72 -133.2942 -11.7144 72 -133.2942 -11.7144 -72 -136.5 5 -72
  [4,16,-136.5,5,72,-133.2942,-11.7144,72,-133.2942,-11.7144,-72,-136.5,5,-72],
// 4 16 -133.2942 -11.7144 -72 -135.226 -12.232 -72 -138.4522 4 -72 -136.5 5 -72
  [4,16,-133.2942,-11.7144,-72,-135.226,-12.232,-72,-138.4522,4,-72,-136.5,5,-72],
// 4 16 -136.5 5 72 -138.4522 4 72 -135.226 -12.232 72 -133.2942 -11.7144 72
  [4,16,-136.5,5,72,-138.4522,4,72,-135.226,-12.232,72,-133.2942,-11.7144,72],
// 2 24 -135.226 -12.232 -72 -138.4522 4 -72
  [2,24,-135.226,-12.232,-72,-138.4522,4,-72],
// 2 24 -135.226 -12.232 72 -138.4522 4 72
  [2,24,-135.226,-12.232,72,-138.4522,4,72],
// 
// 1 16 -137.5 5 -72 1 0 0 0 0 1 0 144 0 1-4cylo.dat
  [1,16,-137.5,5,-72,1,0,0,0,0,1,0,144,0, ldraw_lib__1_4cylo()],
// 1 16 -137.5 5 -72 1 0 0 0 0 1 0 1 0 1-4chrd.dat
  [1,16,-137.5,5,-72,1,0,0,0,0,1,0,1,0, ldraw_lib__1_4chrd()],
// 1 16 -137.5 5 72 1 0 0 0 0 1 0 -1 0 1-4chrd.dat
  [1,16,-137.5,5,72,1,0,0,0,0,1,0,-1,0, ldraw_lib__1_4chrd()],
// 4 16 -138.4522 4 72 -136.5 5 72 -137.5 6 72 -138.4522 6 72
  [4,16,-138.4522,4,72,-136.5,5,72,-137.5,6,72,-138.4522,6,72],
// 4 16 -138.4522 6 -68.5 -138.4522 6 68.5 -137.5 6 72 -137.5 6 -72
  [4,16,-138.4522,6,-68.5,-138.4522,6,68.5,-137.5,6,72,-137.5,6,-72],
// 4 16 -136.5 5 -72 -138.4522 4 -72 -138.4522 6 -72 -137.5 6 -72
  [4,16,-136.5,5,-72,-138.4522,4,-72,-138.4522,6,-72,-137.5,6,-72],
// 3 16 -138.4522 6 -72 -138.4522 6 -68.5 -137.5 6 -72
  [3,16,-138.4522,6,-72,-138.4522,6,-68.5,-137.5,6,-72],
// 3 16 -138.4522 6 68.5 -138.4522 6 72 -137.5 6 72
  [3,16,-138.4522,6,68.5,-138.4522,6,72,-137.5,6,72],
// 2 24 -138.4522 6 72 -137.5 6 72
  [2,24,-138.4522,6,72,-137.5,6,72],
// 2 24 -138.4522 6 -72 -137.5 6 -72
  [2,24,-138.4522,6,-72,-137.5,6,-72],
// 2 24 -136.5 5 -72 -133.2942 -11.7144 -72
  [2,24,-136.5,5,-72,-133.2942,-11.7144,-72],
// 2 24 -136.5 5 72 -133.2942 -11.7144 72
  [2,24,-136.5,5,72,-133.2942,-11.7144,72],
// 
// 0 // Lip
// 4 16 -138.4522 6 -68.5 -144 6 -68.5 -147.5 6 -65 -147.5 6 -54.5
  [4,16,-138.4522,6,-68.5,-144,6,-68.5,-147.5,6,-65,-147.5,6,-54.5],
// 4 16 -138.4522 6 -68.5 -147.5 6 -14.5 -147.5 6 14.5 -138.4522 6 68.5
  [4,16,-138.4522,6,-68.5,-147.5,6,-14.5,-147.5,6,14.5,-138.4522,6,68.5],
// 3 16 -147.5 6 54.5 -138.4522 6 68.5 -147.5 6 25.5
  [3,16,-147.5,6,54.5,-138.4522,6,68.5,-147.5,6,25.5],
// 3 16 -147.5 6 25.5 -138.4522 6 68.5 -147.5 6 14.5
  [3,16,-147.5,6,25.5,-138.4522,6,68.5,-147.5,6,14.5],
// 3 16 -147.5 6 -25.5 -147.5 6 -14.5 -138.4522 6 -68.5
  [3,16,-147.5,6,-25.5,-147.5,6,-14.5,-138.4522,6,-68.5],
// 3 16 -147.5 6 -25.5 -138.4522 6 -68.5 -147.5 6 -54.5
  [3,16,-147.5,6,-25.5,-138.4522,6,-68.5,-147.5,6,-54.5],
// 4 16 -147.5 6 65 -144 6 68.5 -138.4522 6 68.5 -147.5 6 54.5
  [4,16,-147.5,6,65,-144,6,68.5,-138.4522,6,68.5,-147.5,6,54.5],
// 1 16 -144 6 -65 -3.5 0 0 0 -1 0 0 0 -3.5 1-4chrd.dat
  [1,16,-144,6,-65,-3.5,0,0,0,-1,0,0,0,-3.5, ldraw_lib__1_4chrd()],
// 1 16 -144 6 65 -3.5 0 0 0 -1 0 0 0 3.5 1-4chrd.dat
  [1,16,-144,6,65,-3.5,0,0,0,-1,0,0,0,3.5, ldraw_lib__1_4chrd()],
// 1 16 -144 4 -65 -3.5 0 0 0 2 0 0 0 -3.5 1-4cylo.dat
  [1,16,-144,4,-65,-3.5,0,0,0,2,0,0,0,-3.5, ldraw_lib__1_4cylo()],
// 1 16 -144 4 65 -3.5 0 0 0 2 0 0 0 3.5 1-4cylo.dat
  [1,16,-144,4,65,-3.5,0,0,0,2,0,0,0,3.5, ldraw_lib__1_4cylo()],
// 1 16 -141.2261 5 68.5 0 0 2.7739 1 0 0 0 -1 0 rect2a.dat
  [1,16,-141.2261,5,68.5,0,0,2.7739,1,0,0,0,-1,0, ldraw_lib__rect2a()],
// 1 16 -141.2261 5 -68.5 0 0 2.7739 1 0 0 0 1 0 rect2a.dat
  [1,16,-141.2261,5,-68.5,0,0,2.7739,1,0,0,0,1,0, ldraw_lib__rect2a()],
// 1 16 -144 4 -65 -3.5 0 0 0 1 0 0 0 -3.5 1-4chrd.dat
  [1,16,-144,4,-65,-3.5,0,0,0,1,0,0,0,-3.5, ldraw_lib__1_4chrd()],
// 1 16 -144 4 65 -3.5 0 0 0 1 0 0 0 3.5 1-4chrd.dat
  [1,16,-144,4,65,-3.5,0,0,0,1,0,0,0,3.5, ldraw_lib__1_4chrd()],
// 
// 1 16 -147.5 5 59.75 0 1 0 1 0 0 0 0 -5.25 rect3.dat
  [1,16,-147.5,5,59.75,0,1,0,1,0,0,0,0,-5.25, ldraw_lib__rect3()],
// 1 16 -147.5 5 40 0 -12 0 1 0 0 0 0 14.5 box5-4a.dat
  [1,16,-147.5,5,40,0,-12,0,1,0,0,0,0,14.5, ldraw_lib__box5_4a()],
// 1 16 -147.5 5 20 0 1 0 0 0 1 -5.5 0 0 rect.dat
  [1,16,-147.5,5,20,0,1,0,0,0,1,-5.5,0,0, ldraw_lib__rect()],
// 1 16 -147.5 5 0 0 -12 0 1 0 0 0 0 14.5 box5-4a.dat
  [1,16,-147.5,5,0,0,-12,0,1,0,0,0,0,14.5, ldraw_lib__box5_4a()],
// 1 16 -147.5 5 -20 0 1 0 0 0 1 -5.5 0 0 rect.dat
  [1,16,-147.5,5,-20,0,1,0,0,0,1,-5.5,0,0, ldraw_lib__rect()],
// 1 16 -147.5 5 -40 0 -12 0 1 0 0 0 0 14.5 box5-4a.dat
  [1,16,-147.5,5,-40,0,-12,0,1,0,0,0,0,14.5, ldraw_lib__box5_4a()],
// 1 16 -147.5 5 -59.75 0 1 0 1 0 0 0 0 5.25 rect3.dat
  [1,16,-147.5,5,-59.75,0,1,0,1,0,0,0,0,5.25, ldraw_lib__rect3()],
// 
// 1 16 -141.2261 4 0 0 0 2.7739 0 1 0 -68.5 0 0 recte3.dat
  [1,16,-141.2261,4,0,0,0,2.7739,0,1,0,-68.5,0,0, ldraw_lib__recte3()],
// 4 16 -147.5 4 14.5 -147.5 4 -14.5 -138.4522 4 -68.5 -138.4522 4 68.5
  [4,16,-147.5,4,14.5,-147.5,4,-14.5,-138.4522,4,-68.5,-138.4522,4,68.5],
// 4 16 -147.5 4 -65 -144 4 -68.5 -138.4522 4 -68.5 -147.5 4 -54.5
  [4,16,-147.5,4,-65,-144,4,-68.5,-138.4522,4,-68.5,-147.5,4,-54.5],
// 4 16 -138.4522 4 68.5 -144 4 68.5 -147.5 4 65 -147.5 4 54.5
  [4,16,-138.4522,4,68.5,-144,4,68.5,-147.5,4,65,-147.5,4,54.5],
// 3 16 -138.4522 4 68.5 -147.5 4 54.5 -147.5 4 25.5
  [3,16,-138.4522,4,68.5,-147.5,4,54.5,-147.5,4,25.5],
// 3 16 -138.4522 4 68.5 -147.5 4 25.5 -147.5 4 14.5
  [3,16,-138.4522,4,68.5,-147.5,4,25.5,-147.5,4,14.5],
// 3 16 -147.5 4 -14.5 -147.5 4 -25.5 -138.4522 4 -68.5
  [3,16,-147.5,4,-14.5,-147.5,4,-25.5,-138.4522,4,-68.5],
// 3 16 -138.4522 4 -68.5 -147.5 4 -25.5 -147.5 4 -54.5
  [3,16,-138.4522,4,-68.5,-147.5,4,-25.5,-147.5,4,-54.5],
// 
// 0 // Mirrored
// 
// 0 BFC INVERTNEXT
  [0,"BFC","INVERTNEXT"],
// 1 16 0 24 -72 0 0 138 -138 0 0 0 144 0 48\5-24cylo.dat
  [1,16,0,24,-72,0,0,138,-138,0,0,0,144,0, ldraw_lib__48__5_24cylo()],
// 1 16 0 24 -72 0 0 2 -2 0 0 0 1 0 48\5-24ring69.dat
  [1,16,0,24,-72,0,0,2,-2,0,0,0,1,0, ldraw_lib__48__5_24ring69()],
// 1 16 0 24 72 0 0 2 -2 0 0 0 -1 0 48\5-24ring69.dat
  [1,16,0,24,72,0,0,2,-2,0,0,0,-1,0, ldraw_lib__48__5_24ring69()],
// 1 16 0 24 -72 0 0 140 -140 0 0 0 144 0 48\5-24cylo.dat
  [1,16,0,24,-72,0,0,140,-140,0,0,0,144,0, ldraw_lib__48__5_24cylo()],
// 4 16 138.4522 4 68.5 135.226 -12.232 72 135.226 -12.232 -72 138.4522 4 -68.5
  [4,16,138.4522,4,68.5,135.226,-12.232,72,135.226,-12.232,-72,138.4522,4,-68.5],
// 3 16 138.4522 4 -72 138.4522 4 -68.5 135.226 -12.232 -72
  [3,16,138.4522,4,-72,138.4522,4,-68.5,135.226,-12.232,-72],
// 3 16 138.4522 4 68.5 138.4522 4 72 135.226 -12.232 72
  [3,16,138.4522,4,68.5,138.4522,4,72,135.226,-12.232,72],
// 1 16 138.4522 5 70.25 0 -1 0 0 0 1 1.75 0 0 rect2a.dat
  [1,16,138.4522,5,70.25,0,-1,0,0,0,1,1.75,0,0, ldraw_lib__rect2a()],
// 1 16 138.4522 5 -70.25 0 -1 0 0 0 1 -1.75 0 0 rect2a.dat
  [1,16,138.4522,5,-70.25,0,-1,0,0,0,1,-1.75,0,0, ldraw_lib__rect2a()],
// 4 16 133.2942 -11.7144 -72 133.2942 -11.7144 72 136.5 5 72 136.5 5 -72
  [4,16,133.2942,-11.7144,-72,133.2942,-11.7144,72,136.5,5,72,136.5,5,-72],
// 4 16 138.4522 4 -72 135.226 -12.232 -72 133.2942 -11.7144 -72 136.5 5 -72
  [4,16,138.4522,4,-72,135.226,-12.232,-72,133.2942,-11.7144,-72,136.5,5,-72],
// 4 16 135.226 -12.232 72 138.4522 4 72 136.5 5 72 133.2942 -11.7144 72
  [4,16,135.226,-12.232,72,138.4522,4,72,136.5,5,72,133.2942,-11.7144,72],
// 2 24 135.226 -12.232 -72 138.4522 4 -72
  [2,24,135.226,-12.232,-72,138.4522,4,-72],
// 2 24 135.226 -12.232 72 138.4522 4 72
  [2,24,135.226,-12.232,72,138.4522,4,72],
// 
// 1 16 137.5 5 -72 -1 0 0 0 0 1 0 144 0 1-4cylo.dat
  [1,16,137.5,5,-72,-1,0,0,0,0,1,0,144,0, ldraw_lib__1_4cylo()],
// 1 16 137.5 5 -72 -1 0 0 0 0 1 0 1 0 1-4chrd.dat
  [1,16,137.5,5,-72,-1,0,0,0,0,1,0,1,0, ldraw_lib__1_4chrd()],
// 1 16 137.5 5 72 -1 0 0 0 0 1 0 -1 0 1-4chrd.dat
  [1,16,137.5,5,72,-1,0,0,0,0,1,0,-1,0, ldraw_lib__1_4chrd()],
// 4 16 137.5 6 72 136.5 5 72 138.4522 4 72 138.4522 6 72
  [4,16,137.5,6,72,136.5,5,72,138.4522,4,72,138.4522,6,72],
// 4 16 137.5 6 72 138.4522 6 68.5 138.4522 6 -68.5 137.5 6 -72
  [4,16,137.5,6,72,138.4522,6,68.5,138.4522,6,-68.5,137.5,6,-72],
// 4 16 138.4522 6 -72 138.4522 4 -72 136.5 5 -72 137.5 6 -72
  [4,16,138.4522,6,-72,138.4522,4,-72,136.5,5,-72,137.5,6,-72],
// 3 16 138.4522 6 -68.5 138.4522 6 -72 137.5 6 -72
  [3,16,138.4522,6,-68.5,138.4522,6,-72,137.5,6,-72],
// 3 16 138.4522 6 72 138.4522 6 68.5 137.5 6 72
  [3,16,138.4522,6,72,138.4522,6,68.5,137.5,6,72],
// 2 24 138.4522 6 72 137.5 6 72
  [2,24,138.4522,6,72,137.5,6,72],
// 2 24 138.4522 6 -72 137.5 6 -72
  [2,24,138.4522,6,-72,137.5,6,-72],
// 2 24 136.5 5 -72 133.2942 -11.7144 -72
  [2,24,136.5,5,-72,133.2942,-11.7144,-72],
// 2 24 136.5 5 72 133.2942 -11.7144 72
  [2,24,136.5,5,72,133.2942,-11.7144,72],
// 
// 0 // Lip
// 4 16 147.5 6 -65 144 6 -68.5 138.4522 6 -68.5 147.5 6 -54.5
  [4,16,147.5,6,-65,144,6,-68.5,138.4522,6,-68.5,147.5,6,-54.5],
// 4 16 147.5 6 14.5 147.5 6 -14.5 138.4522 6 -68.5 138.4522 6 68.5
  [4,16,147.5,6,14.5,147.5,6,-14.5,138.4522,6,-68.5,138.4522,6,68.5],
// 3 16 138.4522 6 68.5 147.5 6 54.5 147.5 6 25.5
  [3,16,138.4522,6,68.5,147.5,6,54.5,147.5,6,25.5],
// 3 16 138.4522 6 68.5 147.5 6 25.5 147.5 6 14.5
  [3,16,138.4522,6,68.5,147.5,6,25.5,147.5,6,14.5],
// 3 16 147.5 6 -14.5 147.5 6 -25.5 138.4522 6 -68.5
  [3,16,147.5,6,-14.5,147.5,6,-25.5,138.4522,6,-68.5],
// 3 16 138.4522 6 -68.5 147.5 6 -25.5 147.5 6 -54.5
  [3,16,138.4522,6,-68.5,147.5,6,-25.5,147.5,6,-54.5],
// 4 16 138.4522 6 68.5 144 6 68.5 147.5 6 65 147.5 6 54.5
  [4,16,138.4522,6,68.5,144,6,68.5,147.5,6,65,147.5,6,54.5],
// 1 16 144 6 -65 3.5 0 0 0 -1 0 0 0 -3.5 1-4chrd.dat
  [1,16,144,6,-65,3.5,0,0,0,-1,0,0,0,-3.5, ldraw_lib__1_4chrd()],
// 1 16 144 6 65 3.5 0 0 0 -1 0 0 0 3.5 1-4chrd.dat
  [1,16,144,6,65,3.5,0,0,0,-1,0,0,0,3.5, ldraw_lib__1_4chrd()],
// 1 16 144 4 -65 3.5 0 0 0 2 0 0 0 -3.5 1-4cylo.dat
  [1,16,144,4,-65,3.5,0,0,0,2,0,0,0,-3.5, ldraw_lib__1_4cylo()],
// 1 16 144 4 65 3.5 0 0 0 2 0 0 0 3.5 1-4cylo.dat
  [1,16,144,4,65,3.5,0,0,0,2,0,0,0,3.5, ldraw_lib__1_4cylo()],
// 1 16 141.2261 5 68.5 0 0 -2.7739 1 0 0 0 -1 0 rect2a.dat
  [1,16,141.2261,5,68.5,0,0,-2.7739,1,0,0,0,-1,0, ldraw_lib__rect2a()],
// 1 16 141.2261 5 -68.5 0 0 -2.7739 1 0 0 0 1 0 rect2a.dat
  [1,16,141.2261,5,-68.5,0,0,-2.7739,1,0,0,0,1,0, ldraw_lib__rect2a()],
// 1 16 144 4 -65 3.5 0 0 0 1 0 0 0 -3.5 1-4chrd.dat
  [1,16,144,4,-65,3.5,0,0,0,1,0,0,0,-3.5, ldraw_lib__1_4chrd()],
// 1 16 144 4 65 3.5 0 0 0 1 0 0 0 3.5 1-4chrd.dat
  [1,16,144,4,65,3.5,0,0,0,1,0,0,0,3.5, ldraw_lib__1_4chrd()],
// 
// 1 16 147.5 5 59.75 0 -1 0 1 0 0 0 0 -5.25 rect3.dat
  [1,16,147.5,5,59.75,0,-1,0,1,0,0,0,0,-5.25, ldraw_lib__rect3()],
// 1 16 147.5 5 40 0 12 0 1 0 0 0 0 14.5 box5-4a.dat
  [1,16,147.5,5,40,0,12,0,1,0,0,0,0,14.5, ldraw_lib__box5_4a()],
// 1 16 147.5 5 20 0 -1 0 0 0 1 -5.5 0 0 rect.dat
  [1,16,147.5,5,20,0,-1,0,0,0,1,-5.5,0,0, ldraw_lib__rect()],
// 1 16 147.5 5 0 0 12 0 1 0 0 0 0 14.5 box5-4a.dat
  [1,16,147.5,5,0,0,12,0,1,0,0,0,0,14.5, ldraw_lib__box5_4a()],
// 1 16 147.5 5 -20 0 -1 0 0 0 1 -5.5 0 0 rect.dat
  [1,16,147.5,5,-20,0,-1,0,0,0,1,-5.5,0,0, ldraw_lib__rect()],
// 1 16 147.5 5 -40 0 12 0 1 0 0 0 0 14.5 box5-4a.dat
  [1,16,147.5,5,-40,0,12,0,1,0,0,0,0,14.5, ldraw_lib__box5_4a()],
// 1 16 147.5 5 -59.75 0 -1 0 1 0 0 0 0 5.25 rect3.dat
  [1,16,147.5,5,-59.75,0,-1,0,1,0,0,0,0,5.25, ldraw_lib__rect3()],
// 
// 1 16 141.2261 4 0 0 0 -2.7739 0 1 0 -68.5 0 0 recte3.dat
  [1,16,141.2261,4,0,0,0,-2.7739,0,1,0,-68.5,0,0, ldraw_lib__recte3()],
// 4 16 138.4522 4 -68.5 147.5 4 -14.5 147.5 4 14.5 138.4522 4 68.5
  [4,16,138.4522,4,-68.5,147.5,4,-14.5,147.5,4,14.5,138.4522,4,68.5],
// 4 16 138.4522 4 -68.5 144 4 -68.5 147.5 4 -65 147.5 4 -54.5
  [4,16,138.4522,4,-68.5,144,4,-68.5,147.5,4,-65,147.5,4,-54.5],
// 4 16 147.5 4 65 144 4 68.5 138.4522 4 68.5 147.5 4 54.5
  [4,16,147.5,4,65,144,4,68.5,138.4522,4,68.5,147.5,4,54.5],
// 3 16 147.5 4 54.5 138.4522 4 68.5 147.5 4 25.5
  [3,16,147.5,4,54.5,138.4522,4,68.5,147.5,4,25.5],
// 3 16 147.5 4 25.5 138.4522 4 68.5 147.5 4 14.5
  [3,16,147.5,4,25.5,138.4522,4,68.5,147.5,4,14.5],
// 3 16 147.5 4 -25.5 147.5 4 -14.5 138.4522 4 -68.5
  [3,16,147.5,4,-25.5,147.5,4,-14.5,138.4522,4,-68.5],
// 3 16 147.5 4 -25.5 138.4522 4 -68.5 147.5 4 -54.5
  [3,16,147.5,4,-25.5,138.4522,4,-68.5,147.5,4,-54.5],
// 
// 0 // added condlines
// 5 24 138.4522 4 -72 138.4522 4 -68.5 135.226 -12.232 -72 138.4522 6 -72
  [5,24,138.4522,4,-72,138.4522,4,-68.5,135.226,-12.232,-72,138.4522,6,-72],
// 5 24 -138.4522 4 -68.5 -138.4522 4 -72 -138.4522 6 -72 -135.226 -12.232 -72
  [5,24,-138.4522,4,-68.5,-138.4522,4,-72,-138.4522,6,-72,-135.226,-12.232,-72],
// 5 24 138.4522 4 68.5 138.4522 4 72 135.226 -12.232 72 138.4522 6 72
  [5,24,138.4522,4,68.5,138.4522,4,72,135.226,-12.232,72,138.4522,6,72],
// 5 24 -138.4522 4 72 -138.4522 4 68.5 -135.226 -12.232 72 -138.4522 6 72
  [5,24,-138.4522,4,72,-138.4522,4,68.5,-135.226,-12.232,72,-138.4522,6,72],
// 5 24 -135.226 -12.232 -72 -135.226 -12.232 72 -138.452 4 68.5 -129.346 -29.578 -72
  [5,24,-135.226,-12.232,-72,-135.226,-12.232,72,-138.452,4,68.5,-129.346,-29.578,-72],
// 5 24 -133.294 -11.7144 72 -133.294 -11.7144 -72 -136.5 5 72 -127.498 -28.8126 72
  [5,24,-133.294,-11.7144,72,-133.294,-11.7144,-72,-136.5,5,72,-127.498,-28.8126,72],
// 5 24 135.226 -12.232 72 135.226 -12.232 -72 138.452 4 68.5 129.346 -29.578 72
  [5,24,135.226,-12.232,72,135.226,-12.232,-72,138.452,4,68.5,129.346,-29.578,72],
// 5 24 133.294 -11.7144 -72 133.294 -11.7144 72 136.5 5 72 127.498 -28.8126 -72
  [5,24,133.294,-11.7144,-72,133.294,-11.7144,72,136.5,5,72,127.498,-28.8126,-72],
];
module ldraw_lib__u9540(step=0, col=false, unit=2/5, alt=false, line=0.2, solid=!$preview)
    makepoly(ldraw_lib__u9540(), step=step, col=col, unit=unit, alt=alt, line=line, solid=solid);
ldraw_lib__u9540(line=0.2);
